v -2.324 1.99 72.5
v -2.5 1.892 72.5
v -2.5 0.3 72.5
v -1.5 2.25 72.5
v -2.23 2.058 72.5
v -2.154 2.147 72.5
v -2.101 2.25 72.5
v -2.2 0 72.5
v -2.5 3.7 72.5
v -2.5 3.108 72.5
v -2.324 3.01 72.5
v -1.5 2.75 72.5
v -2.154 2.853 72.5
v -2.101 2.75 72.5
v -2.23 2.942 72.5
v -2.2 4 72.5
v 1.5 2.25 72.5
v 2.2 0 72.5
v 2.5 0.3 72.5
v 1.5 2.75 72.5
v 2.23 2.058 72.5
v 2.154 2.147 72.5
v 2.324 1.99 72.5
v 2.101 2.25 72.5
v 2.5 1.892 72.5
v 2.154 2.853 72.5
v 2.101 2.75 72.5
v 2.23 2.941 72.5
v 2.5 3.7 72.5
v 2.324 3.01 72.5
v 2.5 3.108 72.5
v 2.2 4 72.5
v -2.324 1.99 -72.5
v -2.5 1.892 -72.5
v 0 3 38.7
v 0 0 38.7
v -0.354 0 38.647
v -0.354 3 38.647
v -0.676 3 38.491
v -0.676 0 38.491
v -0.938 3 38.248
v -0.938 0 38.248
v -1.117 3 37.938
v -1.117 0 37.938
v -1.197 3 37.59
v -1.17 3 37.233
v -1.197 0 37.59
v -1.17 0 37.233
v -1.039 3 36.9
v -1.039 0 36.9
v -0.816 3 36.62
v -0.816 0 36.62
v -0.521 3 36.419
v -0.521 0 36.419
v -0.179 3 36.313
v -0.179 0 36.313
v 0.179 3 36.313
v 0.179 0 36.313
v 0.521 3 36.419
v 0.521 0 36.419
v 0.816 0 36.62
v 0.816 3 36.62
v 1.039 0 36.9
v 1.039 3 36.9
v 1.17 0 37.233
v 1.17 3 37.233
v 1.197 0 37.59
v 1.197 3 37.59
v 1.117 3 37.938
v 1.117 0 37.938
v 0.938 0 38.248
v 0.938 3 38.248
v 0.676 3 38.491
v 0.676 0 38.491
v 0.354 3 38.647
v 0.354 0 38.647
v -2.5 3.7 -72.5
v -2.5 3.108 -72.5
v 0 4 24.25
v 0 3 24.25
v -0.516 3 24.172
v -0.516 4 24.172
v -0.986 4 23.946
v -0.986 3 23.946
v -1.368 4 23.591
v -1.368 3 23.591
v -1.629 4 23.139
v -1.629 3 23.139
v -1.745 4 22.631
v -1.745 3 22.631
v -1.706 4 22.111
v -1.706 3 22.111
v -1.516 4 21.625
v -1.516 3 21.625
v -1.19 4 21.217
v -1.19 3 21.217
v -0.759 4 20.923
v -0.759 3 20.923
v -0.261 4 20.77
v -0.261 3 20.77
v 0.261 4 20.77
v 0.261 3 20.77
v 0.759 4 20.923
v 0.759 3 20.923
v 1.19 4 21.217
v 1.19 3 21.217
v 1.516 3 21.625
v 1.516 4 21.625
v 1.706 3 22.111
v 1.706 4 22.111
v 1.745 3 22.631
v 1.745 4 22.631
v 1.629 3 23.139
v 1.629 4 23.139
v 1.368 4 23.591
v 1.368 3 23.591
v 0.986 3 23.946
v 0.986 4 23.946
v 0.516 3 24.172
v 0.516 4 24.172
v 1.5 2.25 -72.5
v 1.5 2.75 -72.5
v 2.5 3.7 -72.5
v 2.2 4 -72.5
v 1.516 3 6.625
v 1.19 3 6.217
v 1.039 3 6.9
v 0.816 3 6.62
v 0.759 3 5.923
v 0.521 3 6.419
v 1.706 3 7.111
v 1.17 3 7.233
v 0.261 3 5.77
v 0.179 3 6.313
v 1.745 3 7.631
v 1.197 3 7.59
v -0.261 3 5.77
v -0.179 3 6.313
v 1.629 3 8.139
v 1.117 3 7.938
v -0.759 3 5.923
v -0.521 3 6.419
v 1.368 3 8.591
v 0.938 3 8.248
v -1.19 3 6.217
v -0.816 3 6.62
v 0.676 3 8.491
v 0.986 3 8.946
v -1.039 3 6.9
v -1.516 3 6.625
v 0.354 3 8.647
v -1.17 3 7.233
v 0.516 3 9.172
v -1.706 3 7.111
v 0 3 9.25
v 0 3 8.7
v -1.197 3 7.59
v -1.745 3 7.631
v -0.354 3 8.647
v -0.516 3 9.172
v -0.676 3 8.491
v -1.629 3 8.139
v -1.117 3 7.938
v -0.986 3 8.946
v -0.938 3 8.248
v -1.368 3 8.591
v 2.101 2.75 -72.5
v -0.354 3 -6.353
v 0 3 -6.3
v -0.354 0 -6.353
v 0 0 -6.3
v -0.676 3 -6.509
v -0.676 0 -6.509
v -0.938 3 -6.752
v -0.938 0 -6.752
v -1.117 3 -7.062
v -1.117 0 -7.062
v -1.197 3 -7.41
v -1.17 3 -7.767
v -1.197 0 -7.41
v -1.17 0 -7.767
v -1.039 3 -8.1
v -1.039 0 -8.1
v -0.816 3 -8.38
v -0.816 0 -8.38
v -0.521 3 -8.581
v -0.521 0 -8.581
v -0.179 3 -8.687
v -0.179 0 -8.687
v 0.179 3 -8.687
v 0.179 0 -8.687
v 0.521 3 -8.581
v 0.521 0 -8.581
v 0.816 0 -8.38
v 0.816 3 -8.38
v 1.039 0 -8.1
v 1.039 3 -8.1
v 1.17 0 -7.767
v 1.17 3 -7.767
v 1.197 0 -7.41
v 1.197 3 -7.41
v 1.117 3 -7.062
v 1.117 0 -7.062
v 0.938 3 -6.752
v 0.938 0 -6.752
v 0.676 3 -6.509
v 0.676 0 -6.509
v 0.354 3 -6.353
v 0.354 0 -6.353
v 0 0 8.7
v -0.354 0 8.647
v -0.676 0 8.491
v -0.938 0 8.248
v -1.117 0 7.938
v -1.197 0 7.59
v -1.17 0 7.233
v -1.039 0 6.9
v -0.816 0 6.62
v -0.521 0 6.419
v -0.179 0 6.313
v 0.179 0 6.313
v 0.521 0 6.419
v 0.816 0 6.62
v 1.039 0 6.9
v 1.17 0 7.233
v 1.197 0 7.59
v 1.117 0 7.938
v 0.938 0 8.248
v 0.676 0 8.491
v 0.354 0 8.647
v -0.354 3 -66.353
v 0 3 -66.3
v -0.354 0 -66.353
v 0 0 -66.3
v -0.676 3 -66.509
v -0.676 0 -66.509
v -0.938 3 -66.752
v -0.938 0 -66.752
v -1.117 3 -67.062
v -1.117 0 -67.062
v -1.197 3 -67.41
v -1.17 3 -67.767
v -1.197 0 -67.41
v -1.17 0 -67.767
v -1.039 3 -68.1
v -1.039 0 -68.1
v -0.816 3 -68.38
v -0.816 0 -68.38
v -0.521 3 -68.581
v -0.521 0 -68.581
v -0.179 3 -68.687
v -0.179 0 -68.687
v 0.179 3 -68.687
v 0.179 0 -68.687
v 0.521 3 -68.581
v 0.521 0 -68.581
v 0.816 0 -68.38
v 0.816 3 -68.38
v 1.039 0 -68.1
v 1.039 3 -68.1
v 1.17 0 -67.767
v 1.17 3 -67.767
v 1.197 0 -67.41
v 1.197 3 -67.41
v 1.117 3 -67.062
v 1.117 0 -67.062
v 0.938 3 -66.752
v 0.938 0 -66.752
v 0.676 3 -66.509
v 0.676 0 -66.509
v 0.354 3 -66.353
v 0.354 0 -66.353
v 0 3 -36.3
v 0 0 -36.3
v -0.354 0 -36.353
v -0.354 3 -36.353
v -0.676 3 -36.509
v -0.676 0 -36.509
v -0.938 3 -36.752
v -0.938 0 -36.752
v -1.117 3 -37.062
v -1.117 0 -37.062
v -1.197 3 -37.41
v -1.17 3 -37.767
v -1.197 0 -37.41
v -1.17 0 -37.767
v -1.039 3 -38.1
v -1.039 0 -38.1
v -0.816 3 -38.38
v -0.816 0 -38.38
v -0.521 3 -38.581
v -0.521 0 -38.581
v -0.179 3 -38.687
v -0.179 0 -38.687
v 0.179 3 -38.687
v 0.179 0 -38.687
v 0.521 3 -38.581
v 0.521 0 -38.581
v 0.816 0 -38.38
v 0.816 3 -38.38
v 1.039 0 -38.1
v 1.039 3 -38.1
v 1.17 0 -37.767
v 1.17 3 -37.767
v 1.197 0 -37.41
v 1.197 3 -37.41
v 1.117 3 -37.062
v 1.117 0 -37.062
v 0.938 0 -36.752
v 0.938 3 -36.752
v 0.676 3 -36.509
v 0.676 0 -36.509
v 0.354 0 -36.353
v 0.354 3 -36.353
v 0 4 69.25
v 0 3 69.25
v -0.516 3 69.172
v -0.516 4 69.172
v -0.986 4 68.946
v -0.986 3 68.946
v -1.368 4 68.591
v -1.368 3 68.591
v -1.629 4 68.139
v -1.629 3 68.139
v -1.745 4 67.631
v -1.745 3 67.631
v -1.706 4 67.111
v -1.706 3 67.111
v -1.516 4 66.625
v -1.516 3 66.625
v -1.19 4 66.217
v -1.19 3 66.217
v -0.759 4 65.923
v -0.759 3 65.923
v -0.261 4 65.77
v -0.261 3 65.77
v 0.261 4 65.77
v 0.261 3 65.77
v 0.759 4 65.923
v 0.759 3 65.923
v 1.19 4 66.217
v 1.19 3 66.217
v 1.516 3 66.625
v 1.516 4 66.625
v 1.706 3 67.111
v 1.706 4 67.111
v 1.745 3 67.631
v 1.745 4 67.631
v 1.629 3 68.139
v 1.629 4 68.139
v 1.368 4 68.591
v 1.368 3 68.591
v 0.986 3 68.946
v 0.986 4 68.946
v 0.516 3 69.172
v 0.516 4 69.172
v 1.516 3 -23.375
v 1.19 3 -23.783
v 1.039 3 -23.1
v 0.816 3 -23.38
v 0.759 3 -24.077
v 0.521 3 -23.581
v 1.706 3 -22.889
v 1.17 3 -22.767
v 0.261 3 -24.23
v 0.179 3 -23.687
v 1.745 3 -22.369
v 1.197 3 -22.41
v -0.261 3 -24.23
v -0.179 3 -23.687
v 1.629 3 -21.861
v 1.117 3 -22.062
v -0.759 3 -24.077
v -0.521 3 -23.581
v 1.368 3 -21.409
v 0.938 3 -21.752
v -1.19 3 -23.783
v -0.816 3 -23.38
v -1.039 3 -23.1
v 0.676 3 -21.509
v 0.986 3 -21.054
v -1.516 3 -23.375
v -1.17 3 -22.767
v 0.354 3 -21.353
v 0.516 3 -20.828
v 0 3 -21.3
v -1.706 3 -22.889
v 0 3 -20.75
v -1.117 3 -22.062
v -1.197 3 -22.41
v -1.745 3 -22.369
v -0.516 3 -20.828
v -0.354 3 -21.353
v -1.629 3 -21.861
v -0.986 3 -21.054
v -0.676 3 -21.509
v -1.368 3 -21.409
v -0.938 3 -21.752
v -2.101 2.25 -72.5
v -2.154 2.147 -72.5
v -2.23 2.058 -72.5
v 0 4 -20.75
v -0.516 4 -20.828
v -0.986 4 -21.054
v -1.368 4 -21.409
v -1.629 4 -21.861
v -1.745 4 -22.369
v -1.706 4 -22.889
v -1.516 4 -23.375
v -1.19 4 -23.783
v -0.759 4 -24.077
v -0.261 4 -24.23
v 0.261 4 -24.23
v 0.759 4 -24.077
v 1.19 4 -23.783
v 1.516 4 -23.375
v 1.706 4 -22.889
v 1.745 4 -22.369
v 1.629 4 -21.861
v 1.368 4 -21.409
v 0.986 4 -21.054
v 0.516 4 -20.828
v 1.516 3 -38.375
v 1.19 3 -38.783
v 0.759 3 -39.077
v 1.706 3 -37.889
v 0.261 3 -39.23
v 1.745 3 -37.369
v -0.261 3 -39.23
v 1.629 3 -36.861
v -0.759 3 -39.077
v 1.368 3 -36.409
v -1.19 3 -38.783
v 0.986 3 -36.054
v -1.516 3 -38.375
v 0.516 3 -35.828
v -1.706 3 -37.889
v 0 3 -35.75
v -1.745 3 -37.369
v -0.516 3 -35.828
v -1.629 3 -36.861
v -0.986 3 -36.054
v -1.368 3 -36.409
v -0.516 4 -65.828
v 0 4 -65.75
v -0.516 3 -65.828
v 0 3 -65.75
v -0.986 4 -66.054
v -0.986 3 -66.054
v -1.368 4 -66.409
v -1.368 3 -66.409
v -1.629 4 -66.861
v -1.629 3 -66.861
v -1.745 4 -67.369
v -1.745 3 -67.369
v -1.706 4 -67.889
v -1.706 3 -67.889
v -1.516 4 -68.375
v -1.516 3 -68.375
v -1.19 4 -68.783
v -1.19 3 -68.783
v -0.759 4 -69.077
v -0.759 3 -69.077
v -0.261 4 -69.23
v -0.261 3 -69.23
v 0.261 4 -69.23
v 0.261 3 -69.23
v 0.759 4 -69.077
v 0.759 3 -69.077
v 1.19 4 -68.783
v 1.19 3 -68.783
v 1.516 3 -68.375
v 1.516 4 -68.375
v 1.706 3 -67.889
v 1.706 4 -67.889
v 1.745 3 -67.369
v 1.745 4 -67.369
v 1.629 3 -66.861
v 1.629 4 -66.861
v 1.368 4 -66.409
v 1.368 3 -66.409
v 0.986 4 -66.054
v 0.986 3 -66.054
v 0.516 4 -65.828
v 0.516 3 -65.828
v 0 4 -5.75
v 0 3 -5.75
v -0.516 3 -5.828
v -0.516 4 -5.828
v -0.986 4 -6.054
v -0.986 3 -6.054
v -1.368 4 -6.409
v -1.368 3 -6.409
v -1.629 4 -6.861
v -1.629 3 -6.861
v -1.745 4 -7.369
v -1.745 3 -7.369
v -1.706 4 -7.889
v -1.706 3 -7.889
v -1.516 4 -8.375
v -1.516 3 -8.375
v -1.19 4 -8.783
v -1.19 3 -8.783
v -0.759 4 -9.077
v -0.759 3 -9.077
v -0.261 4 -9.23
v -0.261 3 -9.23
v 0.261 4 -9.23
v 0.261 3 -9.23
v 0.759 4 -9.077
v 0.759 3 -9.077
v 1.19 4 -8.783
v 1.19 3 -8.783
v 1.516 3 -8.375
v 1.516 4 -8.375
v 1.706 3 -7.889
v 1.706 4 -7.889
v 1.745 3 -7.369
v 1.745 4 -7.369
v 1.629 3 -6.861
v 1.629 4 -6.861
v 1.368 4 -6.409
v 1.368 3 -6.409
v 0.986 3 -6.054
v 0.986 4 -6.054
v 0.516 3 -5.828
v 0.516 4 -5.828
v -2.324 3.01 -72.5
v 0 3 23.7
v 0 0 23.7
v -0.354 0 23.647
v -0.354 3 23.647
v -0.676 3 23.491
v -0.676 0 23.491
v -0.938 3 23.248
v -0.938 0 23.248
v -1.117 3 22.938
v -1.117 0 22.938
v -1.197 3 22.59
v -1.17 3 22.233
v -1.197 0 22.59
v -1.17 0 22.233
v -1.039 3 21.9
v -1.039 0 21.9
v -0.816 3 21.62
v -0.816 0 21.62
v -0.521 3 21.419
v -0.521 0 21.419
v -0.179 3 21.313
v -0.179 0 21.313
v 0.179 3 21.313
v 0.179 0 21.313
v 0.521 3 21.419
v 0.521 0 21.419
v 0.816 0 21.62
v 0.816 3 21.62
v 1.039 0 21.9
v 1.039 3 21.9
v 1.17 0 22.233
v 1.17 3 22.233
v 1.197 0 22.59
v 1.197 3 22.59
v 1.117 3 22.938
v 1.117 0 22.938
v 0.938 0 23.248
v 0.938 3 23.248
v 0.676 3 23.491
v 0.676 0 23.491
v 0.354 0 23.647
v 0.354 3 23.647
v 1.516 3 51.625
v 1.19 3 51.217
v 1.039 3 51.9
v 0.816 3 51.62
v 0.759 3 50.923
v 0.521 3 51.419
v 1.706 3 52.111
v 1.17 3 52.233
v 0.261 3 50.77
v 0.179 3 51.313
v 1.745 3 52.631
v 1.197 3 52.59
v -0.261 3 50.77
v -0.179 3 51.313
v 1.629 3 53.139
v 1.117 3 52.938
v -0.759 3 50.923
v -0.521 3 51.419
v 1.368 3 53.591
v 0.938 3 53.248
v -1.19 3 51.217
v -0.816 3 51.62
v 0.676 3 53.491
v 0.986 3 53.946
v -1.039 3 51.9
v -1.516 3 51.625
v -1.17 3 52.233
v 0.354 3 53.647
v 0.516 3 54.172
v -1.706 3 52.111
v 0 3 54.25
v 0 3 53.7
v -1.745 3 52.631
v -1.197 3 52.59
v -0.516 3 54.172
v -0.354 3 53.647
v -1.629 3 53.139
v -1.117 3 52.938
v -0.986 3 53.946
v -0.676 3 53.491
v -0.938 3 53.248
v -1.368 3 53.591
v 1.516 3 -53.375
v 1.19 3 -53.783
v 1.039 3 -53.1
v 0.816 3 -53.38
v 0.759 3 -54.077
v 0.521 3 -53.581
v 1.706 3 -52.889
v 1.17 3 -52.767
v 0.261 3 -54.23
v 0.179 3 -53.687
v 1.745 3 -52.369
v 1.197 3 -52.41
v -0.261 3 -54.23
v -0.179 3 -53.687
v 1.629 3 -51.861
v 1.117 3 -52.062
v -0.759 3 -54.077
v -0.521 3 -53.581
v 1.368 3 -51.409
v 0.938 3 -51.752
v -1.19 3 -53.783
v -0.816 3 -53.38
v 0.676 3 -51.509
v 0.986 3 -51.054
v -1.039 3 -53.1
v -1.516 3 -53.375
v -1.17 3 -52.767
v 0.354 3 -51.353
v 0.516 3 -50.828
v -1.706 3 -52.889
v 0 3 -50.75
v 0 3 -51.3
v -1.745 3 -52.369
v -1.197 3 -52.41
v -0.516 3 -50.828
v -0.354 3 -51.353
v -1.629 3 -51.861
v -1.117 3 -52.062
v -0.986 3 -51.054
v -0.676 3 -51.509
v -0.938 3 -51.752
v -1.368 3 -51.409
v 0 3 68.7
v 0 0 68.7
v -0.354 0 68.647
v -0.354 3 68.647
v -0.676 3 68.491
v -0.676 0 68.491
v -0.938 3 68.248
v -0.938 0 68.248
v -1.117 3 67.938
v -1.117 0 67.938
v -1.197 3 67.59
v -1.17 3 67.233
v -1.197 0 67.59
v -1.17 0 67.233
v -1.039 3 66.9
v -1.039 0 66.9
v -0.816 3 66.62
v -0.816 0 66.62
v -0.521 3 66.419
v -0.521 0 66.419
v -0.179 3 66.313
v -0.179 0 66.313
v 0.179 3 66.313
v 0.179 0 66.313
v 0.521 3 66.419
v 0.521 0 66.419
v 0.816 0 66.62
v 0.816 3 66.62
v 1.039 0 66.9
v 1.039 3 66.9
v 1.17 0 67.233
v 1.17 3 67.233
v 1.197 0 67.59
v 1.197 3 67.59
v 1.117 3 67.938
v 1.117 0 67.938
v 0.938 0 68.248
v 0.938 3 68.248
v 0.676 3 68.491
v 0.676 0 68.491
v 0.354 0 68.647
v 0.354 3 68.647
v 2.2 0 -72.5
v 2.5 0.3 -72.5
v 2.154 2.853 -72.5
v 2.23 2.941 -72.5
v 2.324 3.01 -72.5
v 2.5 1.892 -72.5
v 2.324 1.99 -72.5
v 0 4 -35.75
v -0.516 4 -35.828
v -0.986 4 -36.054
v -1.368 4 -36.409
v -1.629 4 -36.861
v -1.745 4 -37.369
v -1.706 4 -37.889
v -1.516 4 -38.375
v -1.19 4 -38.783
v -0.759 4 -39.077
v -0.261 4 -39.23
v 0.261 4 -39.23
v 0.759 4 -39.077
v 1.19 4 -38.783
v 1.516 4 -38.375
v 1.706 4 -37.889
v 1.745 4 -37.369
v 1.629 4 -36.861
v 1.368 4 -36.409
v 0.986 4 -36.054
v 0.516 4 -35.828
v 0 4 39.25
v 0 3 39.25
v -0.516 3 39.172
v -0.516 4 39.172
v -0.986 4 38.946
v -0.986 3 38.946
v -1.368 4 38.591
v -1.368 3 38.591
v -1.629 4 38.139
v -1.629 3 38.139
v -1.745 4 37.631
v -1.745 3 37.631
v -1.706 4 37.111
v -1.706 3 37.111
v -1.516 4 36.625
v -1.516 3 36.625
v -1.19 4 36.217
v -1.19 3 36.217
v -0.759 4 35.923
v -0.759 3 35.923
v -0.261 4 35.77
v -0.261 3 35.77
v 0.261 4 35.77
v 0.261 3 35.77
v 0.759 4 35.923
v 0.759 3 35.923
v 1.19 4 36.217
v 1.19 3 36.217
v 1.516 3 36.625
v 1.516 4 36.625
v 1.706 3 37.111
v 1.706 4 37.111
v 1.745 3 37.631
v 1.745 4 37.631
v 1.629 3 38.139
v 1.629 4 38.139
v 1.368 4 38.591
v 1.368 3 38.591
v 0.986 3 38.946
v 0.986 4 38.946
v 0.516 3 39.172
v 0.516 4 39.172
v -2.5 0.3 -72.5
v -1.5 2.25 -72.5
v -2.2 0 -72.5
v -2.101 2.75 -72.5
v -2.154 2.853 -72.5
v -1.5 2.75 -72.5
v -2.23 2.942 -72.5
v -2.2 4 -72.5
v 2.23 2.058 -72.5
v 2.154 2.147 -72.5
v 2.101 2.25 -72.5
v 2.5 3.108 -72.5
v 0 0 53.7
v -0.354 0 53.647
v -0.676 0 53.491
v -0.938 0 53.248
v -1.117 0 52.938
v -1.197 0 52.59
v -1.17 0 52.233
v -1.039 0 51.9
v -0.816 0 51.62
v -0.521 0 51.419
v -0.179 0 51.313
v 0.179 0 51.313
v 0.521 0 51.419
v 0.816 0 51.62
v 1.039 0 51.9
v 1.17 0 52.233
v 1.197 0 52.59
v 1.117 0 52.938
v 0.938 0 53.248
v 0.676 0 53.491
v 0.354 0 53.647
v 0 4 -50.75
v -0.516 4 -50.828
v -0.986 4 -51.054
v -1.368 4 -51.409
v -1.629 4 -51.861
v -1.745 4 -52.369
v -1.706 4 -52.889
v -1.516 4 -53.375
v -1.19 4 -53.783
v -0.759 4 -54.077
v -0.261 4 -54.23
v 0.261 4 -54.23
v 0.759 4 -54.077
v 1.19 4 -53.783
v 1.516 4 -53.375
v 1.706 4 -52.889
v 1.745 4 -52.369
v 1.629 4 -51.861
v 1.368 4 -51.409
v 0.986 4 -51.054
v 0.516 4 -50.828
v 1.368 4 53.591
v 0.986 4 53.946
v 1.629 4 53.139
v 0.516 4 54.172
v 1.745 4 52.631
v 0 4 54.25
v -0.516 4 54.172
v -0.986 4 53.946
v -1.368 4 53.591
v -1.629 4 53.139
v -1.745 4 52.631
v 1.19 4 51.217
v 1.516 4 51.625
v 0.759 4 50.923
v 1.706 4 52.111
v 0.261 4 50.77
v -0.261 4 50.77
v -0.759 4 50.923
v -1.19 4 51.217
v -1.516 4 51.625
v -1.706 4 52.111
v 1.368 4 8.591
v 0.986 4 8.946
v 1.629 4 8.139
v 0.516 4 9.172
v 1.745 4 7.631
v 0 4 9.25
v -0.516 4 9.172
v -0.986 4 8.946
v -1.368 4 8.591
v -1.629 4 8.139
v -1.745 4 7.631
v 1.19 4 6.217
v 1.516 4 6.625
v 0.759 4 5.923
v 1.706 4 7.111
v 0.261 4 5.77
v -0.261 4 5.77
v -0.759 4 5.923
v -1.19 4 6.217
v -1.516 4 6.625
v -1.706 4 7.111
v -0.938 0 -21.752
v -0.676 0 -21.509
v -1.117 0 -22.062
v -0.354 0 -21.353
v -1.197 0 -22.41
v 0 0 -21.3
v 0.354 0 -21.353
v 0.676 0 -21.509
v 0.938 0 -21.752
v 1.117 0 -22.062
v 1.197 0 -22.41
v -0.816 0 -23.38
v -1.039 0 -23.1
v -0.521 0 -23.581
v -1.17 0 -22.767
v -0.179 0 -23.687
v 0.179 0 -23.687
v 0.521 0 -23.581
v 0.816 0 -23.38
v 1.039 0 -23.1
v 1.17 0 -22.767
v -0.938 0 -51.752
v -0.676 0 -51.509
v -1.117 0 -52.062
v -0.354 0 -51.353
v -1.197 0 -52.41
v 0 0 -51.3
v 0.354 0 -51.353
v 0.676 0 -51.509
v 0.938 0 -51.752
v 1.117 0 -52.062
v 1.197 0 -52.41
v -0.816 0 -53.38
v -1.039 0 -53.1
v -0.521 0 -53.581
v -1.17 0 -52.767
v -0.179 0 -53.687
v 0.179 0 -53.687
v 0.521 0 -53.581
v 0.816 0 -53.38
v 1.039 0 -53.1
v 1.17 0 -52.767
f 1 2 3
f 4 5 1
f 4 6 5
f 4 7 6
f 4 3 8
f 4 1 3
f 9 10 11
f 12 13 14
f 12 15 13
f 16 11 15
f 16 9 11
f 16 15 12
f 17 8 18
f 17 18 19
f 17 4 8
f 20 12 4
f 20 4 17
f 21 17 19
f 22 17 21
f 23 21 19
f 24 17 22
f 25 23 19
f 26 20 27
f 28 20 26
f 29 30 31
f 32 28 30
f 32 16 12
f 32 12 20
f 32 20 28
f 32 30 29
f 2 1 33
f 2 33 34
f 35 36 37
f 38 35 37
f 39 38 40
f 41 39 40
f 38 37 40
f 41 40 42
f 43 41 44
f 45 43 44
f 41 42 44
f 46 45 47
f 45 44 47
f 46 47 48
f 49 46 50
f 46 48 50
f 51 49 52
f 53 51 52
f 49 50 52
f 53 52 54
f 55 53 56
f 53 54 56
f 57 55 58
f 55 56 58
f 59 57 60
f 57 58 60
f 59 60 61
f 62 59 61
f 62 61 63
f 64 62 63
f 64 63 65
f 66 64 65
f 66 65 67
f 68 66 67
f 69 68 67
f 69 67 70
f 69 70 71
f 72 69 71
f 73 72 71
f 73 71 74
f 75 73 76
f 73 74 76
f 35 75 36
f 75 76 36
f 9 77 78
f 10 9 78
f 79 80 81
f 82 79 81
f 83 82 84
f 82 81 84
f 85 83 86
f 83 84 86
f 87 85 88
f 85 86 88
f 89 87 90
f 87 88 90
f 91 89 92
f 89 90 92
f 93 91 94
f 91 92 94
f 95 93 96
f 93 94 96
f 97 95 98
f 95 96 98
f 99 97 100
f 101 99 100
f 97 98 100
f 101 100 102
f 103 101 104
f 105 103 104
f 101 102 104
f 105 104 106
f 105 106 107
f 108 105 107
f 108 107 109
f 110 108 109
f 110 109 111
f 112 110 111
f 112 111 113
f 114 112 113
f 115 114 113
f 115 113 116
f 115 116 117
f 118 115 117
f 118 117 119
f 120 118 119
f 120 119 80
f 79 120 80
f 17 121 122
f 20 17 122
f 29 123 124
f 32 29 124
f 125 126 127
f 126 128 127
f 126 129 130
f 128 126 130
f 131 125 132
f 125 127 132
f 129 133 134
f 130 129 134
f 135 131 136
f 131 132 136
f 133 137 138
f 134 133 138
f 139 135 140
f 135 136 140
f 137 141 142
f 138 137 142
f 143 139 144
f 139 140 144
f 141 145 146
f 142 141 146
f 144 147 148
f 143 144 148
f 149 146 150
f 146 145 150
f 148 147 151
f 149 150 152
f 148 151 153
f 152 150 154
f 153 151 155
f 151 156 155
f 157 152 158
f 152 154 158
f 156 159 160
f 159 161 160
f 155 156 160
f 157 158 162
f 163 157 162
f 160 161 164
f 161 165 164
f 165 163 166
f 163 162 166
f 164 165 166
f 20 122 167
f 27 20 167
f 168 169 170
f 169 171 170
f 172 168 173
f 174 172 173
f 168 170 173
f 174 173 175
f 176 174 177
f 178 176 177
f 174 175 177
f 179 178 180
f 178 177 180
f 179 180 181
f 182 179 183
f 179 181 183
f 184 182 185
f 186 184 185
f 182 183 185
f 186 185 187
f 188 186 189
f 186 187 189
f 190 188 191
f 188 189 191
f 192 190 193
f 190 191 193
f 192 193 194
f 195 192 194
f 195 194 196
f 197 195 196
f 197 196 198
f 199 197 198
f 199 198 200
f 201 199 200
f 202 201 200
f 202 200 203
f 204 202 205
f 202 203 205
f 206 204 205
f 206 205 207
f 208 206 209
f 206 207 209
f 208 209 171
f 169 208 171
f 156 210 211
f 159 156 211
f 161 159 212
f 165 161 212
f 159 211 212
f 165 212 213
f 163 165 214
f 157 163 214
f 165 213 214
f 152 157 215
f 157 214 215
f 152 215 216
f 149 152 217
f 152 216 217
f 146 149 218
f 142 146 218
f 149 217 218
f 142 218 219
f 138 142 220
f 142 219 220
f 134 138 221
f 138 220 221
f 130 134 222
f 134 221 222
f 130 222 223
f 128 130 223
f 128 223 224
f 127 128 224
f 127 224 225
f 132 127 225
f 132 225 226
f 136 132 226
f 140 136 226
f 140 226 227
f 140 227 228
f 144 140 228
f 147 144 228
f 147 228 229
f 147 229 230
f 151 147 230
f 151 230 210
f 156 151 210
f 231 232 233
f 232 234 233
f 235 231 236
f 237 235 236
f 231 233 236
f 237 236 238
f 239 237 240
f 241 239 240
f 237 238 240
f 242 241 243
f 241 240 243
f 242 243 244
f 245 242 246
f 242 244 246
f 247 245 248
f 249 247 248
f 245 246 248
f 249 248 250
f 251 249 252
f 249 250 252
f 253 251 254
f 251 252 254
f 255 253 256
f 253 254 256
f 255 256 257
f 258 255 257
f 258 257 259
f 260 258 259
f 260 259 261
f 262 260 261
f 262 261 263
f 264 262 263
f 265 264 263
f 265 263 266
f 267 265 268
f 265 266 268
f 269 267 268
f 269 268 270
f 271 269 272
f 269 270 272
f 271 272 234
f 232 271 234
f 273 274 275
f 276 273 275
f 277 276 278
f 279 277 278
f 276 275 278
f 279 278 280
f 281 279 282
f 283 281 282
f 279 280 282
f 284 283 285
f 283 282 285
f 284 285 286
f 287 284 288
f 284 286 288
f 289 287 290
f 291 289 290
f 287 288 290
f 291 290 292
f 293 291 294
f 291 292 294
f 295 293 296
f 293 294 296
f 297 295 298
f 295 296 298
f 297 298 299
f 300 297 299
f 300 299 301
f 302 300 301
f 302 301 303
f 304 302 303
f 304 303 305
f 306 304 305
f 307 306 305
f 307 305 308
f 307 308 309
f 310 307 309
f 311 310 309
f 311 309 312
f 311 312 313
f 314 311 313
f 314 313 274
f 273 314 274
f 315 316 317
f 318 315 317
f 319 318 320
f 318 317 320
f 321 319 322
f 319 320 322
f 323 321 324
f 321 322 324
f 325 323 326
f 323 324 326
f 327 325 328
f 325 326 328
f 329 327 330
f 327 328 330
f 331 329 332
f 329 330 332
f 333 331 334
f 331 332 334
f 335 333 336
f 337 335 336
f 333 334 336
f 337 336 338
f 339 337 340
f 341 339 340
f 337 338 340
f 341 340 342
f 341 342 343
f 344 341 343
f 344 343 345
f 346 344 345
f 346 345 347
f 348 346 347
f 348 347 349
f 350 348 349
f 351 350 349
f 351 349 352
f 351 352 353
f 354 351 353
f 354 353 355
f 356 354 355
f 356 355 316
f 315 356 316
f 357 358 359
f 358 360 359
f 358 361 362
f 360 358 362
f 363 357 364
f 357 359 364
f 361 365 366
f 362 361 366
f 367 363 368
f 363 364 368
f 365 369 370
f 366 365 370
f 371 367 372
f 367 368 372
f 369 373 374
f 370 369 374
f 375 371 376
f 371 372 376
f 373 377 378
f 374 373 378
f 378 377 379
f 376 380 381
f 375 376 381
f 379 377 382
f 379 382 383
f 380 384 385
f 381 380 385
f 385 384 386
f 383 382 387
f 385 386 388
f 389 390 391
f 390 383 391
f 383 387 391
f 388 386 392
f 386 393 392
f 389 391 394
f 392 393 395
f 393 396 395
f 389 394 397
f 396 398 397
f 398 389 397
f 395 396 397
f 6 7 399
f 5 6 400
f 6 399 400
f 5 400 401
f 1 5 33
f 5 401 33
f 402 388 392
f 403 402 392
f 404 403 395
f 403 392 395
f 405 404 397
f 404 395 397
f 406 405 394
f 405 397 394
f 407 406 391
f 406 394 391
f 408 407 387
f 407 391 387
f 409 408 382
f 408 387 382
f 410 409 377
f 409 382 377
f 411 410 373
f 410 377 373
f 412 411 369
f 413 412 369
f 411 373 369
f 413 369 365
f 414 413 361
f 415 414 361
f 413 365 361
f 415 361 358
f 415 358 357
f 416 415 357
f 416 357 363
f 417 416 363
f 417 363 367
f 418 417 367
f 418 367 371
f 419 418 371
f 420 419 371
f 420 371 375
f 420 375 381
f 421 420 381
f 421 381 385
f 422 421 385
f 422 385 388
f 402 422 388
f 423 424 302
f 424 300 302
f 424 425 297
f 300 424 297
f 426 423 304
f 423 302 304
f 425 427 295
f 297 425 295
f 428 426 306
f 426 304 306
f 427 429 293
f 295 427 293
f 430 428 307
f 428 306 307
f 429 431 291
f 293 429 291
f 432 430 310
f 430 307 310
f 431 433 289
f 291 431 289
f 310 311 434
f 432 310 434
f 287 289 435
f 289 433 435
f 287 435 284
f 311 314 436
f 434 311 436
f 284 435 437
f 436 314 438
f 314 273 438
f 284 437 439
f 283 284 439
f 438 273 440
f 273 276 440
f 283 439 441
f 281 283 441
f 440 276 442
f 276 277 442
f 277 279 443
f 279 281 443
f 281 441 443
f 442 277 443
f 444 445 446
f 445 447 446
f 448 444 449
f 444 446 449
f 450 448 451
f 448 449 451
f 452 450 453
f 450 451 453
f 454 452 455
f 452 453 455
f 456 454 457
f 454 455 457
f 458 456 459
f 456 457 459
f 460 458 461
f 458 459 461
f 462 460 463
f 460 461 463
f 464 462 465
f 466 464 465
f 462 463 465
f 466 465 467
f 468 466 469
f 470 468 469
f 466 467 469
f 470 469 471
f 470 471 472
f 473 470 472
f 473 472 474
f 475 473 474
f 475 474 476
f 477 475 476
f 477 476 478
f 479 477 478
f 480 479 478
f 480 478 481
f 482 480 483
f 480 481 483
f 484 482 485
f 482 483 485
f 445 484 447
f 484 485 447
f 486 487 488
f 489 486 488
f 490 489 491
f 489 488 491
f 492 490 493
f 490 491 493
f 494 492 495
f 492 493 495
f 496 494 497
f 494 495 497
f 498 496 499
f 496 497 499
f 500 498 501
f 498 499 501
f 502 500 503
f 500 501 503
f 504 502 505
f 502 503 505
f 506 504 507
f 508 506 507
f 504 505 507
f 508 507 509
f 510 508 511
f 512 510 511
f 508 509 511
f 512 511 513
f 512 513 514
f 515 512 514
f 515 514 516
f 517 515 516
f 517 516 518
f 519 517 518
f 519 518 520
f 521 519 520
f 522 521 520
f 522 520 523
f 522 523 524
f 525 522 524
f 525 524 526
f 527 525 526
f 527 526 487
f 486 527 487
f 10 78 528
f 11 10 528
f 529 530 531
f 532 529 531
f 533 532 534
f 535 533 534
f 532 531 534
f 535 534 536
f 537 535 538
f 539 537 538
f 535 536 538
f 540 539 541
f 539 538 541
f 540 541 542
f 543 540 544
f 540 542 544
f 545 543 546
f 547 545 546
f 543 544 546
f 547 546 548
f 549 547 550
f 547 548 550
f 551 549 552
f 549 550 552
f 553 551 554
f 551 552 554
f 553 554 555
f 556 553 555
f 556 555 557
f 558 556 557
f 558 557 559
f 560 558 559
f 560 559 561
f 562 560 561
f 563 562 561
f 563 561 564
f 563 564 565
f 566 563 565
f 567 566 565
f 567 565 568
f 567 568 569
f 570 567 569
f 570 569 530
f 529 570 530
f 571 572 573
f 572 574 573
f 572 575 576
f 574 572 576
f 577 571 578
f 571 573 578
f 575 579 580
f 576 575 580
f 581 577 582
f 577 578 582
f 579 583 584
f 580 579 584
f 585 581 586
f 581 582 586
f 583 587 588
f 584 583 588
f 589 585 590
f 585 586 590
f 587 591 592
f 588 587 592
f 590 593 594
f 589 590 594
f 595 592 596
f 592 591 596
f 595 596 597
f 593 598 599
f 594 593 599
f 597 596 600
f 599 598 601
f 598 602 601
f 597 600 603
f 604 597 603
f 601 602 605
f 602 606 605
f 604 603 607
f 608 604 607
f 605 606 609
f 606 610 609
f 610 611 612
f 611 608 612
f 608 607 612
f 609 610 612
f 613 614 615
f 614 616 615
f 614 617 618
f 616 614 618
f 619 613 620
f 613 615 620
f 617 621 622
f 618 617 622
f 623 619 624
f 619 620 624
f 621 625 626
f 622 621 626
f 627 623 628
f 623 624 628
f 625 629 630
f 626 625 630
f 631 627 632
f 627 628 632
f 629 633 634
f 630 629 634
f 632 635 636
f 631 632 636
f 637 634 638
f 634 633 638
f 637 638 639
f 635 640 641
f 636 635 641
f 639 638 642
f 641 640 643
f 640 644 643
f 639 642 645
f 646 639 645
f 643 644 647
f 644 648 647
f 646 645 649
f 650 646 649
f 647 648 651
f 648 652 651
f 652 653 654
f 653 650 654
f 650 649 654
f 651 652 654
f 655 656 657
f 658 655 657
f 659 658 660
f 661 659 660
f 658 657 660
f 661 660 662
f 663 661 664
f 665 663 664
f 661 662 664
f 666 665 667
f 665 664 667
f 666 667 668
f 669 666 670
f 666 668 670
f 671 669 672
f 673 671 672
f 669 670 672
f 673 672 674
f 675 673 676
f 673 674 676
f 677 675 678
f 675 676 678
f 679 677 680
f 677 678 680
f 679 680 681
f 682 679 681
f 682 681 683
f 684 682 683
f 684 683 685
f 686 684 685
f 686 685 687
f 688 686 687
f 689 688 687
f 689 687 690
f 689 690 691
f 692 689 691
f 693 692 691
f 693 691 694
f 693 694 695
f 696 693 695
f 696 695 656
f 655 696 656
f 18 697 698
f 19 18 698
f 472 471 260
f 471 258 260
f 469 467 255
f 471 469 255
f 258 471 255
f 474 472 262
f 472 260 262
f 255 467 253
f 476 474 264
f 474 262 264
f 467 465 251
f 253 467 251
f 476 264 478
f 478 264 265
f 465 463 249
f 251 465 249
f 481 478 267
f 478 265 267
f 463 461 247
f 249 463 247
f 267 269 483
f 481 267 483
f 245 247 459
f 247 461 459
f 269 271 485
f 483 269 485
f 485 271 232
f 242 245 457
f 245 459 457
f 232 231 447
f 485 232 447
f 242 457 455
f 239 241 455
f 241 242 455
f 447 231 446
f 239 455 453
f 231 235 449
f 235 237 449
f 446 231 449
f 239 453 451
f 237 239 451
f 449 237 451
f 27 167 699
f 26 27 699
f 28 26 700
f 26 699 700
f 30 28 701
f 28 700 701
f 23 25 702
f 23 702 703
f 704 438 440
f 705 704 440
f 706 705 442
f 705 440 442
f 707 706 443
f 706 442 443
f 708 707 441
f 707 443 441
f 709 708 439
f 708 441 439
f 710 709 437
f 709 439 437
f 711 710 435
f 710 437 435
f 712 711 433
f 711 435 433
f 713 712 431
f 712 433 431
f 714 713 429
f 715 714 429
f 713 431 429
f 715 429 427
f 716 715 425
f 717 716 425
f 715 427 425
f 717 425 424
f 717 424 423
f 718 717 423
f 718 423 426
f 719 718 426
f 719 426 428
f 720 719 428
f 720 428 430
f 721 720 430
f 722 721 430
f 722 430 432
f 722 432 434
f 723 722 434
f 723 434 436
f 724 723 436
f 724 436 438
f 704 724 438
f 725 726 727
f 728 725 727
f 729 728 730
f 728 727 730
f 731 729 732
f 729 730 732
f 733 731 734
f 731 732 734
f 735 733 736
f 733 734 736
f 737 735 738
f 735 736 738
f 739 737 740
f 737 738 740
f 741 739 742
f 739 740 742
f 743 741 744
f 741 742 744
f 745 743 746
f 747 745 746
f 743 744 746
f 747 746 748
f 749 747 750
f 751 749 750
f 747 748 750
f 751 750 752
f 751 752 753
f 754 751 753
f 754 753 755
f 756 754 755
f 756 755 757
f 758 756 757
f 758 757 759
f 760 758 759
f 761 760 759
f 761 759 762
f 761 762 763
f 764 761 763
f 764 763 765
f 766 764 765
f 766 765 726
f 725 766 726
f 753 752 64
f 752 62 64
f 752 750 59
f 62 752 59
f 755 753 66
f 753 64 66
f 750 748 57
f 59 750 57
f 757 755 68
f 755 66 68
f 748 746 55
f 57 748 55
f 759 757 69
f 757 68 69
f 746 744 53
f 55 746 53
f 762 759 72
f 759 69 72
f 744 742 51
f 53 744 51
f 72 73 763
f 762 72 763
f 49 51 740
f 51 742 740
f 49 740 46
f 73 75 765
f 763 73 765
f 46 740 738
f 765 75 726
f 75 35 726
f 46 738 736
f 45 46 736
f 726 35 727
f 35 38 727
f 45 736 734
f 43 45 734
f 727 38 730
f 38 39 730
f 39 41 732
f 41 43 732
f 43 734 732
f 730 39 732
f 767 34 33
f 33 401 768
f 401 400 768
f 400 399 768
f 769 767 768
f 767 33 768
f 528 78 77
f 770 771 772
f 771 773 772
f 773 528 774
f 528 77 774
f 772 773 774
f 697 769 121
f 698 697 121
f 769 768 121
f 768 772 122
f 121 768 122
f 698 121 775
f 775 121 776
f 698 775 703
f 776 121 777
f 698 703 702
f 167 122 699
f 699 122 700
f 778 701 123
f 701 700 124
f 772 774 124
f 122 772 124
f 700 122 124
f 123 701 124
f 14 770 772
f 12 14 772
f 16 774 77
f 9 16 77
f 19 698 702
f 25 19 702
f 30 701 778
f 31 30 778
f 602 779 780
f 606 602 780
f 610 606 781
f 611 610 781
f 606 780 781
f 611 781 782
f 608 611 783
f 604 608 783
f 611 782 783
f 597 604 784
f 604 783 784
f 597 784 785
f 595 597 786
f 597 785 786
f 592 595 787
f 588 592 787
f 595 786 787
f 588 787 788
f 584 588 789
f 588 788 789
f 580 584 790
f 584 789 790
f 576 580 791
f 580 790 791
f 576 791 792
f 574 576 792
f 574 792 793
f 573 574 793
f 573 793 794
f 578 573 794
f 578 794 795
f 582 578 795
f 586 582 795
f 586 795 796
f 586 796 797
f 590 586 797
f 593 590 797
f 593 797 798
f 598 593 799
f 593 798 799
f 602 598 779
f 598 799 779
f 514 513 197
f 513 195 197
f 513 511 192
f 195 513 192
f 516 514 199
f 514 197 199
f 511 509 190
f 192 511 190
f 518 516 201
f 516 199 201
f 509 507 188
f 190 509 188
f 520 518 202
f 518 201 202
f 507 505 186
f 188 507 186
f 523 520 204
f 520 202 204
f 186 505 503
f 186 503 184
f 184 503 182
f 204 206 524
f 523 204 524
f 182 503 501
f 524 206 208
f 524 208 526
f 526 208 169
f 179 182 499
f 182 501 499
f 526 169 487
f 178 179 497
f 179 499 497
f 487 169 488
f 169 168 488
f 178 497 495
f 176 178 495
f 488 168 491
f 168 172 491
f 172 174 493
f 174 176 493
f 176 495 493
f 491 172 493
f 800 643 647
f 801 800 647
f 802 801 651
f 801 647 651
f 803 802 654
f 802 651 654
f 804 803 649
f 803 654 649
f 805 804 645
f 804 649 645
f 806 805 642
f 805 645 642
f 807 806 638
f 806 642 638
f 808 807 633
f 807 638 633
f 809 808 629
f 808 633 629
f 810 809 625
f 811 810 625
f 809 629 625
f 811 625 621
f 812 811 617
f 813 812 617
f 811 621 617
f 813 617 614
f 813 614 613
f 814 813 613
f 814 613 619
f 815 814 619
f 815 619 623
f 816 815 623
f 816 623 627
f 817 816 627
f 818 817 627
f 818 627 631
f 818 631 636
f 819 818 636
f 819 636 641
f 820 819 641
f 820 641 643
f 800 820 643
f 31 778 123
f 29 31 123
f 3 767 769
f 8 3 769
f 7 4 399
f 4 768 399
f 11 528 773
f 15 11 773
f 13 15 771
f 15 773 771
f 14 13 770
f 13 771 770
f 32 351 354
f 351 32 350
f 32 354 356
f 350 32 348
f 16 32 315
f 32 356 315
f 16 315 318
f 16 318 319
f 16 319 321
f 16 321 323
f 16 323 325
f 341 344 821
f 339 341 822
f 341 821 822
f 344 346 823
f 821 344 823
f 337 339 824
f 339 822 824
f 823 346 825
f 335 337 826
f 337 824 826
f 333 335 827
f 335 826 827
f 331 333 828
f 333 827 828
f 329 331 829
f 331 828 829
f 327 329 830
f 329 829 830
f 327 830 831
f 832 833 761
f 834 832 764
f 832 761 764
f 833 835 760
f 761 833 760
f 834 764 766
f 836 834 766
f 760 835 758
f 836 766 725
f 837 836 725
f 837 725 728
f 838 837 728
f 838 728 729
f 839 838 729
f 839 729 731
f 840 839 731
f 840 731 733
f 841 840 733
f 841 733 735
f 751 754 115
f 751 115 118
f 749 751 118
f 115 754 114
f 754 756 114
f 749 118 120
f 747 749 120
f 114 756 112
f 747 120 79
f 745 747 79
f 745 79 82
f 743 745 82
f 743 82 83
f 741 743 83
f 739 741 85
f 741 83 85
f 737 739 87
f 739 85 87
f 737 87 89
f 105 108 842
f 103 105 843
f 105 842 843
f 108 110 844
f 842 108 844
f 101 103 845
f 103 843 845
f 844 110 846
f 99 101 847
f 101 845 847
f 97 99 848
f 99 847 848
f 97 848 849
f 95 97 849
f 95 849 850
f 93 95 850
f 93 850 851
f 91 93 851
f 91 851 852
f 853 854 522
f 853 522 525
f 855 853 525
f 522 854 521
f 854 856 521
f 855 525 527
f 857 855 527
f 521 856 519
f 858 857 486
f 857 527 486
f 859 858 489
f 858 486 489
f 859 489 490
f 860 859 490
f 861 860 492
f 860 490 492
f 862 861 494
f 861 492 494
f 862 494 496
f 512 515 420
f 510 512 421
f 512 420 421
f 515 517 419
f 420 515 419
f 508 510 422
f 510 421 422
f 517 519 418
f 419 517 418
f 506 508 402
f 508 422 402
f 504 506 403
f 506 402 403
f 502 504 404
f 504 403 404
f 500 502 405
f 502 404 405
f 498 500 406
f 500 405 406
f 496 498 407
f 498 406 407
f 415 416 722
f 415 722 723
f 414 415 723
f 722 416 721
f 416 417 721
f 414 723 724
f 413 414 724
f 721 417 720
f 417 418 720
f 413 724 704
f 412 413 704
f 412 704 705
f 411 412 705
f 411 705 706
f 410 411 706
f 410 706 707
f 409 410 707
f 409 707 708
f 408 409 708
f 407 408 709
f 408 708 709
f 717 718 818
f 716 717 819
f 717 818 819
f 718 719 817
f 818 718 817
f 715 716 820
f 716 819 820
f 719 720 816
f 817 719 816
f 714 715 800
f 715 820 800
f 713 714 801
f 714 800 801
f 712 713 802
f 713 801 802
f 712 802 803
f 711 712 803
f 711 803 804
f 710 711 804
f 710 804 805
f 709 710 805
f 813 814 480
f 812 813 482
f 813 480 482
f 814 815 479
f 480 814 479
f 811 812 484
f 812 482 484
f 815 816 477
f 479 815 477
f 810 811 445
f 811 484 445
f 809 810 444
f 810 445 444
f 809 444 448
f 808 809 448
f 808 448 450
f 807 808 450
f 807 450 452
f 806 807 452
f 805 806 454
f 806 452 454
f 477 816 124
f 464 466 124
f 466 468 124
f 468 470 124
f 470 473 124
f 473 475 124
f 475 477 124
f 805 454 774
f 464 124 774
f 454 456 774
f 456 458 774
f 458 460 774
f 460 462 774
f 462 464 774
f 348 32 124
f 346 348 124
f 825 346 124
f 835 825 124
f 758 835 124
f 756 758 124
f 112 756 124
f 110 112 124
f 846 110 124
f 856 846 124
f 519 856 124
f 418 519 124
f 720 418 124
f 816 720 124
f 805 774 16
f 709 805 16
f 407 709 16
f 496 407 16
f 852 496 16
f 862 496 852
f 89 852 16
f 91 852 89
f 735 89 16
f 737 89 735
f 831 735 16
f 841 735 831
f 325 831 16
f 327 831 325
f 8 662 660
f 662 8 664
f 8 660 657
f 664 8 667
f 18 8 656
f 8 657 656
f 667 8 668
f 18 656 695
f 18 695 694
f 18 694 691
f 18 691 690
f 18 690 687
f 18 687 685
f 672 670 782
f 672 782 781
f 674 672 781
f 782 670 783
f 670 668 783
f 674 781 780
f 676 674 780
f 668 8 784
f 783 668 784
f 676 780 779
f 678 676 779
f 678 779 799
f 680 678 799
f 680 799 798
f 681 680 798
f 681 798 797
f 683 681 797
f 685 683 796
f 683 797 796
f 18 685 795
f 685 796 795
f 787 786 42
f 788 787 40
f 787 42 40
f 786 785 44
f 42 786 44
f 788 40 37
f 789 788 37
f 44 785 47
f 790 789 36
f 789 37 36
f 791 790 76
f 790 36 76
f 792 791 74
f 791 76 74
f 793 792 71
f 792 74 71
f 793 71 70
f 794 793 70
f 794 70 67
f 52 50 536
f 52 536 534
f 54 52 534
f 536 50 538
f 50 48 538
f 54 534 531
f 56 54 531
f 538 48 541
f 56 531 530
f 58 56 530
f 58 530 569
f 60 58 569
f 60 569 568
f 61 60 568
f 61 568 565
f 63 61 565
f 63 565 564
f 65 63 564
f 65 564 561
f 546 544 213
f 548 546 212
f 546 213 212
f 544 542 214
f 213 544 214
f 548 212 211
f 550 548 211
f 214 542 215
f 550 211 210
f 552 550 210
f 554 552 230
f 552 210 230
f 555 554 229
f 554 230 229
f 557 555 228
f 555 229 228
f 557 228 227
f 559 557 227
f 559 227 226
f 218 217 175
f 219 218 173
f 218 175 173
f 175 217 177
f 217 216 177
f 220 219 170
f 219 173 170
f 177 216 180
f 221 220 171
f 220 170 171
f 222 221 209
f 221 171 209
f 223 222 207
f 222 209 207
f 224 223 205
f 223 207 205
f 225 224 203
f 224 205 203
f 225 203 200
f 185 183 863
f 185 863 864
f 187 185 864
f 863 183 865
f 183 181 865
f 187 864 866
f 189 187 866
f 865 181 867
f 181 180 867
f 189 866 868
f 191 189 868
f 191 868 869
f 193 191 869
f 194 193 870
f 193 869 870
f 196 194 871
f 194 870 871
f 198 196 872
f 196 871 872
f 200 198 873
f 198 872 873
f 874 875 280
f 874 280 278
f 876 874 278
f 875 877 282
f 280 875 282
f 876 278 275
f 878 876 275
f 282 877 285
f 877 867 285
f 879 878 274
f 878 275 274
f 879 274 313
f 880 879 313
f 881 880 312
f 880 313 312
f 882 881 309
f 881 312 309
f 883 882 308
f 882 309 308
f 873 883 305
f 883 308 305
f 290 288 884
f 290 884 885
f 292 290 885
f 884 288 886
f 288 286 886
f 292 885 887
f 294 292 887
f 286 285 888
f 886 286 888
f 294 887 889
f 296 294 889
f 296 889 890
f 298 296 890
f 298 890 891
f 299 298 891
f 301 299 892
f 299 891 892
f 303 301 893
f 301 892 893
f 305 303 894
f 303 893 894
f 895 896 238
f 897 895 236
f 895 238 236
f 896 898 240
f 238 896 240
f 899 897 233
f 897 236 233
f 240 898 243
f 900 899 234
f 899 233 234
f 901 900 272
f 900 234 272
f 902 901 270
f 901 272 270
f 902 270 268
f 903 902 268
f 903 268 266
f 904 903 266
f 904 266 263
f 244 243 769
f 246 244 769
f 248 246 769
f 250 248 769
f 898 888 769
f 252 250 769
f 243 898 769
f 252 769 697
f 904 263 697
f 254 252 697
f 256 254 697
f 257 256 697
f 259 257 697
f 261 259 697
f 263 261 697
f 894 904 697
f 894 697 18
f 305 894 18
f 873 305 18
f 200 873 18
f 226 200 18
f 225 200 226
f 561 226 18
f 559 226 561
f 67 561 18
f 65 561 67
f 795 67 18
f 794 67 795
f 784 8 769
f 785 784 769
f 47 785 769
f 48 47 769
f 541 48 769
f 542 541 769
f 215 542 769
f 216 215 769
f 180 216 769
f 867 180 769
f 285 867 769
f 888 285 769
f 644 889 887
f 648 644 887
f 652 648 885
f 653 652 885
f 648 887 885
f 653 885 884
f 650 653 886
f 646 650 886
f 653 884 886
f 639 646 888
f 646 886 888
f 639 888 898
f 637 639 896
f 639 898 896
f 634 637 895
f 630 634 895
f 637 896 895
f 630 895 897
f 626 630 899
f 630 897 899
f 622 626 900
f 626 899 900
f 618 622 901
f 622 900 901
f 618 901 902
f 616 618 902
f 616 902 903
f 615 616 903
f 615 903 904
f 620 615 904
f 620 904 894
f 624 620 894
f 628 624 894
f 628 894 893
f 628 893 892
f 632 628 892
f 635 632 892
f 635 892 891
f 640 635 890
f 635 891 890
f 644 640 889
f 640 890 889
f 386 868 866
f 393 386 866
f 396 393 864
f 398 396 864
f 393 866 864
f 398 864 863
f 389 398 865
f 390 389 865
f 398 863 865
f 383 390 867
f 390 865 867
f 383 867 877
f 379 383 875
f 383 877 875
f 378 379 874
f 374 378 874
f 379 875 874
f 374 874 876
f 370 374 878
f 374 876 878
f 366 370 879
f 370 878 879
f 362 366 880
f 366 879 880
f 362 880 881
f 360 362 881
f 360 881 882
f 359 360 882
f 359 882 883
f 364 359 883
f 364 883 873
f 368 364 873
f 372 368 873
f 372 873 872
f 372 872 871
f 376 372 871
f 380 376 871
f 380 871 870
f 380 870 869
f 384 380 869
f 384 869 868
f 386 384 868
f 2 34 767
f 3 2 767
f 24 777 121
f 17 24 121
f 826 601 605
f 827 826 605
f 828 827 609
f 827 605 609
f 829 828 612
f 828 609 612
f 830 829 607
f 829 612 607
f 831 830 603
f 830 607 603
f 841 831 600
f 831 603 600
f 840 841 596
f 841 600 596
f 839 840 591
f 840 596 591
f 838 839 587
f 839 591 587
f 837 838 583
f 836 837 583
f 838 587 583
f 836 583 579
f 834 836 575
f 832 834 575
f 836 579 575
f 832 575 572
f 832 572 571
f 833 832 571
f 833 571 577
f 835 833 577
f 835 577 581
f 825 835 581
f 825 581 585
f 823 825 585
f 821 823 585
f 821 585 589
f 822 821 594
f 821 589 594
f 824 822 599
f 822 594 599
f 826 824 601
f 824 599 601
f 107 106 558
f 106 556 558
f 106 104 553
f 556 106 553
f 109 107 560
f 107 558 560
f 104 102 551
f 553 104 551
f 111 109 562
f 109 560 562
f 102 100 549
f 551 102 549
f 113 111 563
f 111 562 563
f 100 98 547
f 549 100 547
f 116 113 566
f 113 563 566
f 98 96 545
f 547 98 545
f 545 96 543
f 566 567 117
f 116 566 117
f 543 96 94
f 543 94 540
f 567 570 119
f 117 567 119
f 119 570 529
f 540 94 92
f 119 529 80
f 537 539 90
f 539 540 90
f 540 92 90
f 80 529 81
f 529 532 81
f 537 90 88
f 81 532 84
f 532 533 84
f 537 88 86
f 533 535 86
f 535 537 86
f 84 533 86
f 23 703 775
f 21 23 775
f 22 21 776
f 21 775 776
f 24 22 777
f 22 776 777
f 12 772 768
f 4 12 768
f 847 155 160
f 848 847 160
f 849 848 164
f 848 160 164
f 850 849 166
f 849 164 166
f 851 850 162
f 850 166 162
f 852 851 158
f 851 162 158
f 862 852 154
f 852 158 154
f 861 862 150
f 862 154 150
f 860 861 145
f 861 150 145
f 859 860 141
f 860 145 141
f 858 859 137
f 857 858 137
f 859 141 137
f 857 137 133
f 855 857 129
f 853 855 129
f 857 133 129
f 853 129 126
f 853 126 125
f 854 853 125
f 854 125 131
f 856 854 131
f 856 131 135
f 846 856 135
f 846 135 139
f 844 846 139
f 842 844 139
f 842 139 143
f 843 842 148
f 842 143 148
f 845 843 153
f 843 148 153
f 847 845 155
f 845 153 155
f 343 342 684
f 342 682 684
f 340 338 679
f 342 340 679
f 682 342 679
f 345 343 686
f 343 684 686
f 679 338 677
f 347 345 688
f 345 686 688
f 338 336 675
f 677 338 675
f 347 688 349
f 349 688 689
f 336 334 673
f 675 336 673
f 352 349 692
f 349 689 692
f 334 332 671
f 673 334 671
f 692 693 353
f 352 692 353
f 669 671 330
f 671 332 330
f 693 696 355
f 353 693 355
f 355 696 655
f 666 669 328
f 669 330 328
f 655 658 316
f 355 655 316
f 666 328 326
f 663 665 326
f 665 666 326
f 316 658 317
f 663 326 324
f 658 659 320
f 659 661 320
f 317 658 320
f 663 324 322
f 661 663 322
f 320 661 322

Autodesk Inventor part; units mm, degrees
sketch "Sketch_12" plane through (0, 0, 0) normal (0, 0, 1) x (1, 0, 0)
  line L0 (-2.5, 3.7) -> (-2.5, 3.1084)
  line L1 (-2.5, 3.1084) -> (-2.3242, 3.0098)
  arc A0 (-2.1007, 2.75) -> (-2.3242, 3.0098) centre (-2.5686, 2.5736) ccw
  line L2 (-2.1007, 2.75) -> (-1.5, 2.75)
  line L3 (-1.5, 2.75) -> (-1.5, 2.25)
  line L4 (-1.5, 2.25) -> (-2.1007, 2.25)
  arc A1 (-2.3242, 1.9902) -> (-2.1007, 2.25) centre (-2.5686, 2.4264) ccw
  line L5 (-2.3242, 1.9902) -> (-2.5, 1.8917)
  line L6 (-2.5, 1.8917) -> (-2.5, 0.3)
  line L7 (-2.5, 0.3) -> (-2.2, 0)
  line L8 (-2.2, 0) -> (2.2, 0)
  line L9 (2.2, 0) -> (2.5, 0.3)
  line L10 (2.5, 0.3) -> (2.5, 1.8917)
  line L11 (2.5, 1.8917) -> (2.3242, 1.9902)
  arc A2 (2.1007, 2.25) -> (2.3242, 1.9902) centre (2.5686, 2.4263) ccw
  line L12 (2.1007, 2.25) -> (1.5, 2.25)
  line L13 (1.5, 2.25) -> (1.5, 2.75)
  line L14 (1.5, 2.75) -> (2.1007, 2.75)
  arc A3 (2.3242, 3.0098) -> (2.1007, 2.75) centre (2.5686, 2.5737) ccw
  line L15 (2.3242, 3.0098) -> (2.5, 3.1084)
  line L16 (2.5, 3.1084) -> (2.5, 3.7)
  line L17 (2.5, 3.7) -> (2.2, 4)
  line L18 (2.2, 4) -> (-2.2, 4)
  line L19 (-2.2, 4) -> (-2.5, 3.7)
extrude "Extrusion1" add sketch "Sketch_12" along normal mid plane 145
sketch "Sketch2" plane through (-2.2, 4, 72.5) normal (0, 1, 0) x (1, 0, 0)
  point P0 (2.2, 140)
hole "Hole1" at (0, 4, -67.5) direction (0, -1, 0) diameter 2.4 depth 4 counterbore diameter 3.5 counterbore depth 1
pattern_linear "Rectangular Pattern1" count 10 spacing 15 along (0, 0, 1) of "Hole1"
ref_plane "rail_to_adjusting_block_XY" through (0, 0, -67.5) normal (0, 1, 0) x (1, 0, 0)
ref_plane "rail_to_adjusting_block_YZ" through (0, 0, -67.5) normal (1, 0, 0) x (0, 0, -1)
ref_plane "rail_to_adjusting_block_ZX" through (0, 0, -67.5) normal (0, 0, -1) x (0, 1, 0)
ref_plane "screw_1_XY" through (0, 3, 67.5) normal (0, -1, 0) x (1, 0, 0)
ref_plane "screw_1_YZ" through (0, 3, 67.5) normal (1, 0, 0) x (0, 0, 1)
ref_plane "screw_1_ZX" through (0, 3, 67.5) normal (0, 0, 1) x (0, -1, 0)
ref_plane "screw_10_XY" through (0, 3, -67.5) normal (0, -1, 0) x (1, 0, 0)
ref_plane "screw_10_YZ" through (0, 3, -67.5) normal (1, 0, 0) x (0, 0, 1)
ref_plane "screw_10_ZX" through (0, 3, -67.5) normal (0, 0, 1) x (0, -1, 0)
ref_plane "screw_2_XY" through (0, 3, 52.5) normal (0, -1, 0) x (1, 0, 0)
ref_plane "screw_2_YZ" through (0, 3, 52.5) normal (1, 0, 0) x (0, 0, 1)
ref_plane "screw_2_ZX" through (0, 3, 52.5) normal (0, 0, 1) x (0, -1, 0)
ref_plane "screw_3_XY" through (0, 3, 37.5) normal (0, -1, 0) x (1, 0, 0)
ref_plane "screw_3_YZ" through (0, 3, 37.5) normal (1, 0, 0) x (0, 0, 1)
ref_plane "screw_3_ZX" through (0, 3, 37.5) normal (0, 0, 1) x (0, -1, 0)
ref_plane "screw_4_XY" through (0, 3, 22.5) normal (0, -1, 0) x (1, 0, 0)
ref_plane "screw_4_YZ" through (0, 3, 22.5) normal (1, 0, 0) x (0, 0, 1)
ref_plane "screw_4_ZX" through (0, 3, 22.5) normal (0, 0, 1) x (0, -1, 0)
ref_plane "screw_5_XY" through (0, 3, 7.5) normal (0, -1, 0) x (1, 0, 0)
ref_plane "screw_5_YZ" through (0, 3, 7.5) normal (1, 0, 0) x (0, 0, 1)
ref_plane "screw_5_ZX" through (0, 3, 7.5) normal (0, 0, 1) x (0, -1, 0)
ref_plane "screw_6_XY" through (0, 3, -7.5) normal (0, -1, 0) x (1, 0, 0)
ref_plane "screw_6_YZ" through (0, 3, -7.5) normal (1, 0, 0) x (0, 0, 1)
ref_plane "screw_6_ZX" through (0, 3, -7.5) normal (0, 0, 1) x (0, -1, 0)
ref_plane "screw_7_XY" through (0, 3, -22.5) normal (0, -1, 0) x (1, 0, 0)
ref_plane "screw_7_YZ" through (0, 3, -22.5) normal (1, 0, 0) x (0, 0, 1)
ref_plane "screw_7_ZX" through (0, 3, -22.5) normal (0, 0, 1) x (0, -1, 0)
ref_plane "screw_8_XY" through (0, 3, -37.5) normal (0, -1, 0) x (1, 0, 0)
ref_plane "screw_8_YZ" through (0, 3, -37.5) normal (1, 0, 0) x (0, 0, 1)
ref_plane "screw_8_ZX" through (0, 3, -37.5) normal (0, 0, 1) x (0, -1, 0)
ref_plane "screw_9_XY" through (0, 3, -52.5) normal (0, -1, 0) x (1, 0, 0)
ref_plane "screw_9_YZ" through (0, 3, -52.5) normal (1, 0, 0) x (0, 0, 1)
ref_plane "screw_9_ZX" through (0, 3, -52.5) normal (0, 0, 1) x (0, -1, 0)
ref_plane "to_block_XY" through (0, 4, 36.25) normal (0, 0, 1) x (1, 0, 0)
ref_plane "to_block_YZ" through (0, 4, 36.25) normal (1, 0, 0) x (0, 1, 0)
ref_plane "to_block_ZX" through (0, 4, 36.25) normal (0, 1, 0) x (0, 0, 1)
ref_plane "to_block_2_XY" through (0, 4, -36.25) normal (0, 0, 1) x (1, 0, 0)
ref_plane "to_block_2_YZ" through (0, 4, -36.25) normal (1, 0, 0) x (0, 1, 0)
ref_plane "to_block_2_ZX" through (0, 4, -36.25) normal (0, 1, 0) x (0, 0, 1)
ref_plane "to_kue_XY" through (0, 0, 0) normal (0, 1, 0) x (1, 0, 0)
ref_plane "to_kue_YZ" through (0, 0, 0) normal (1, 0, 0) x (0, 0, -1)
ref_plane "to_kue_ZX" through (0, 0, 0) normal (0, 0, -1) x (0, 1, 0)
properties part number "SSE2B6-145_r" material "ステンレス鋼"
